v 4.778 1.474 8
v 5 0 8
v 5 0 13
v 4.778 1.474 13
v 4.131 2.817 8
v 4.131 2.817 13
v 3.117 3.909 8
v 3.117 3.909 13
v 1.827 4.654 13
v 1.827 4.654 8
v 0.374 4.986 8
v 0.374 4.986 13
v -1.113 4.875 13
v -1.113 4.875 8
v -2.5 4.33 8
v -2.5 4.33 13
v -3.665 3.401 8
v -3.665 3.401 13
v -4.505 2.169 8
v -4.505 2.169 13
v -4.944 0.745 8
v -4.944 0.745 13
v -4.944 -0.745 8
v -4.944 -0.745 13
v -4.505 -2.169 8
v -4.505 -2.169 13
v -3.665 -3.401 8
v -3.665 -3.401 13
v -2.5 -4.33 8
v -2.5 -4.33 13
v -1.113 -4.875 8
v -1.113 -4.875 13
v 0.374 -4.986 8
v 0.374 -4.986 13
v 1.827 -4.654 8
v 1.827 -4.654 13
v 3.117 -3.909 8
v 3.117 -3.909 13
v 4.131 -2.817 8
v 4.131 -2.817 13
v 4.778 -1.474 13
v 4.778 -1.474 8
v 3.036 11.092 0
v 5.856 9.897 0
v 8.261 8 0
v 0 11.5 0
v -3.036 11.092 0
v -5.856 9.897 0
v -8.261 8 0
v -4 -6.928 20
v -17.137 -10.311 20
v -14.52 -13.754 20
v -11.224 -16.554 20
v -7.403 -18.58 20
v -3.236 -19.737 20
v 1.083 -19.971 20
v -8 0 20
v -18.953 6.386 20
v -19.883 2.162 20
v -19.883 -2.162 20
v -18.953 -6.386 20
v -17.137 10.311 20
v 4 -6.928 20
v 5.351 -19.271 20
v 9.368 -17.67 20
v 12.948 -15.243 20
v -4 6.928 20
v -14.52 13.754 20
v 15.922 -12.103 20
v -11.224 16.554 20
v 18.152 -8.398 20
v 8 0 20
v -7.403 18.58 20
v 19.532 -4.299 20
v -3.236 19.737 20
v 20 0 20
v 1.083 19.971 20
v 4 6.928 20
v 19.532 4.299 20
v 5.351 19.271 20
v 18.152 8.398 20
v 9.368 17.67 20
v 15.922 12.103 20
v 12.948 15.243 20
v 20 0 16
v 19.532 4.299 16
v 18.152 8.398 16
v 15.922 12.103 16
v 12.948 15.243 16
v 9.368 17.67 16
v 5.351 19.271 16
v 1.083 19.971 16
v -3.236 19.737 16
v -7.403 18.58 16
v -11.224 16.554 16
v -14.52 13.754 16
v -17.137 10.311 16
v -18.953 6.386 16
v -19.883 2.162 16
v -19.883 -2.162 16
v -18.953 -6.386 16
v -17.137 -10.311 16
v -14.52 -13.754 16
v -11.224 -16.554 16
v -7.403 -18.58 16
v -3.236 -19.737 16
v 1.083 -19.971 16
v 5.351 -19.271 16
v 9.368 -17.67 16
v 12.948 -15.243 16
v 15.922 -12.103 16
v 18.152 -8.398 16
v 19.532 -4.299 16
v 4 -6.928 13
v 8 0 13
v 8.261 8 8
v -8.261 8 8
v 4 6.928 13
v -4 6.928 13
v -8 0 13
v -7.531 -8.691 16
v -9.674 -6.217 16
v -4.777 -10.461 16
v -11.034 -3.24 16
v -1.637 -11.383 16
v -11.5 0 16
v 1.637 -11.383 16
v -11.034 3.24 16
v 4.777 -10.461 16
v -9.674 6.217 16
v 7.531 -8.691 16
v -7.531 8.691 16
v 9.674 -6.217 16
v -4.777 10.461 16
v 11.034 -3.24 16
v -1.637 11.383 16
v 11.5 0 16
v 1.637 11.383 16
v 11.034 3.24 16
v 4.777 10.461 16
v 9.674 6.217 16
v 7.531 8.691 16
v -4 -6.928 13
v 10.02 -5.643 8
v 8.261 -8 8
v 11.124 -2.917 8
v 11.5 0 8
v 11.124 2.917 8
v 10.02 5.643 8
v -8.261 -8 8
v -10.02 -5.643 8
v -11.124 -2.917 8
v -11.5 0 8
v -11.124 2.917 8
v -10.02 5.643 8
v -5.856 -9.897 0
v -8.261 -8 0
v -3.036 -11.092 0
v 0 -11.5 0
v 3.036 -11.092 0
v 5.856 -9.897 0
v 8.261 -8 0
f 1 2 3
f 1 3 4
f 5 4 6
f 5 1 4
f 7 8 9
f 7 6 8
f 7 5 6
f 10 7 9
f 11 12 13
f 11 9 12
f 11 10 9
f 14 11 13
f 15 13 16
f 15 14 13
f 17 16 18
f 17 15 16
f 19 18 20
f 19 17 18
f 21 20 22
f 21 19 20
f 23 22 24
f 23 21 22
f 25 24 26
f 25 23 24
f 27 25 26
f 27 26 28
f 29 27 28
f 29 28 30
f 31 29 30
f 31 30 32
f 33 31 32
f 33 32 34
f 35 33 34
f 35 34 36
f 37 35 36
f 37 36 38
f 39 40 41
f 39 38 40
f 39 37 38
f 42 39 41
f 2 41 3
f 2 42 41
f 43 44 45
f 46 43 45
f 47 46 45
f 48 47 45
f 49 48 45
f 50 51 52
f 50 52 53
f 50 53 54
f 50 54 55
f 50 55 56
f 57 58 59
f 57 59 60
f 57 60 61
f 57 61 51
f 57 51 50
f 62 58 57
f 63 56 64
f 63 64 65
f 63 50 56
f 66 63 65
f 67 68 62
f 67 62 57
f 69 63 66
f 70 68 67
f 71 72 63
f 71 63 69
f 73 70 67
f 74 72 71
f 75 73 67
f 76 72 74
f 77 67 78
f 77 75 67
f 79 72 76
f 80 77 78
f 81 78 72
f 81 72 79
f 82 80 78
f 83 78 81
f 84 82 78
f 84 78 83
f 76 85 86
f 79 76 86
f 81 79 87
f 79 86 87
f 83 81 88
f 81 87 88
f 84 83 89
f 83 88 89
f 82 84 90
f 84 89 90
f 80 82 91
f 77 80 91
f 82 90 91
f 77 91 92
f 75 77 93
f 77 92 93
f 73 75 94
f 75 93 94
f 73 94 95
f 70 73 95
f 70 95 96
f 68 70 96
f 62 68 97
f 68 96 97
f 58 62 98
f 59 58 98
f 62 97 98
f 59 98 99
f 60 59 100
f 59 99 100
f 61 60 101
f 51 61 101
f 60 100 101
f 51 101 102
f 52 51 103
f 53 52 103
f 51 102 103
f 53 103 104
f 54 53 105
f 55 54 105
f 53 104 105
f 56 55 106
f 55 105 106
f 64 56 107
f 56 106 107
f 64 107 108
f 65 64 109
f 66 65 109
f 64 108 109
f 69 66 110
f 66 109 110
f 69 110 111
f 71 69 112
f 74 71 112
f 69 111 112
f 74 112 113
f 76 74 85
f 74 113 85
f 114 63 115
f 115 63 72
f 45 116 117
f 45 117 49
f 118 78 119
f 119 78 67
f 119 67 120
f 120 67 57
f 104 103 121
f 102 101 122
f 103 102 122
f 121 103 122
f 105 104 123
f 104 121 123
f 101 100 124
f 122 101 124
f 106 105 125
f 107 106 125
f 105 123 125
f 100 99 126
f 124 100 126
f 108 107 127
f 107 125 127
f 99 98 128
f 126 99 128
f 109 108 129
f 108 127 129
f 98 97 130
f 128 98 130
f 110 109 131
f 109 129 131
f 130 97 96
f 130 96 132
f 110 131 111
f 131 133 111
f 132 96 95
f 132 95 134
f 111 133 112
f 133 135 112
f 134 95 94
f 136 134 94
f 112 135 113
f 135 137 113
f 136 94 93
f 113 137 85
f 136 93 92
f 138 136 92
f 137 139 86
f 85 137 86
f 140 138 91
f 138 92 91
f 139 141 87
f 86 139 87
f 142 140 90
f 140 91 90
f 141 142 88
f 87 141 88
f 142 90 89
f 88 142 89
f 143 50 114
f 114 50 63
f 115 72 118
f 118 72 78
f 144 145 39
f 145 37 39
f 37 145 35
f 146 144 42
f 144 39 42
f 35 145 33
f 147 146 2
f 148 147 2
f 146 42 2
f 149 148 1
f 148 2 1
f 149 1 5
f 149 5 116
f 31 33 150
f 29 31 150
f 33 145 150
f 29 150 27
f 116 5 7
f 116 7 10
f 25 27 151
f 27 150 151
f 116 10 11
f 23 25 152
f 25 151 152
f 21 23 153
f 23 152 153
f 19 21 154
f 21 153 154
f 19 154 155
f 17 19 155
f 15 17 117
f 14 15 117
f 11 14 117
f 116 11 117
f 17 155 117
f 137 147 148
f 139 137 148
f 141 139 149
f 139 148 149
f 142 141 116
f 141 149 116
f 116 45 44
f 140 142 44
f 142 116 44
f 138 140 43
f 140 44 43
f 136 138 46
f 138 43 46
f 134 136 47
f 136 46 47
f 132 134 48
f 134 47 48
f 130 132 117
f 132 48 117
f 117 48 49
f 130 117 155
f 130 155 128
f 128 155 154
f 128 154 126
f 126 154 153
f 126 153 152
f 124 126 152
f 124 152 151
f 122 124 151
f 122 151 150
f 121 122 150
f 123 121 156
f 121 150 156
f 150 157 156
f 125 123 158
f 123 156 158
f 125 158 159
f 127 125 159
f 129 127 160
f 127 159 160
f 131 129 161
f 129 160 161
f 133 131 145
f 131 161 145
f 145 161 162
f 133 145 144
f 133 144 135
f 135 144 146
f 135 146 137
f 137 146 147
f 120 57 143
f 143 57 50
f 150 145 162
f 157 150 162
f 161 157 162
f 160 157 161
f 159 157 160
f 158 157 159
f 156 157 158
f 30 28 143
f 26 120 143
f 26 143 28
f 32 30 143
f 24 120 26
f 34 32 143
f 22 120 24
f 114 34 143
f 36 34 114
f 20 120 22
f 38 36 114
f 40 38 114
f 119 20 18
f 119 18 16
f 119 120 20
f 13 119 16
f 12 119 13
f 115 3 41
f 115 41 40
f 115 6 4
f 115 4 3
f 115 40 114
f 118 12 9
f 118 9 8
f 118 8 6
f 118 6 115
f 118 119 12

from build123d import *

# Parameters (mm, degrees)
SKETCH1_R               = 11.5
SKETCH1_R_2             = 5
BOSS_EXTRUDE1_DEPTH     = 20
CUT_EXTRUDE1_DEPTH      = 7
CUT_EXTRUDE2_DEPTH      = 26.777897509
CUT_EXTRUDE2_DEPTH_BACK = 26.777897509
SKETCH3_W               = 8
SKETCH3_H               = 16
BOSS_EXTRUDE2_START     = -4
SKETCH4_R               = 20
SKETCH4_R_2             = 11.5
BOSS_EXTRUDE2_DEPTH     = 4


with BuildPart() as part:
    # Sketch1 → Boss-Extrude1 (new body)
    with BuildSketch(Plane.XY):
        Circle(SKETCH1_R)
        Circle(SKETCH1_R_2, mode=Mode.SUBTRACT)
    extrude(amount=BOSS_EXTRUDE1_DEPTH)

    # Sketch2 → Cut-Extrude1 (cut)
    with BuildSketch(Plane.XY.offset(20)):
        Polygon((8, 0), (4, 6.92820323), (-4, 6.92820323), (-8, 0), (-4, -6.92820323), (4, -6.92820323), align=None)
    extrude(amount=-CUT_EXTRUDE1_DEPTH, mode=Mode.SUBTRACT)

    # Sketch3 → Cut-Extrude2 (cut, two sides: drawn at the far end of the back side and taken through both)
    with BuildSketch(Plane(origin=(0, 0, 0), x_dir=(0, 0, -1), z_dir=(1, 0, 0)).offset(-CUT_EXTRUDE2_DEPTH_BACK)):
        with Locations((-4, 0)):
            Rectangle(SKETCH3_W, SKETCH3_H)
    extrude(amount=CUT_EXTRUDE2_DEPTH + CUT_EXTRUDE2_DEPTH_BACK, mode=Mode.SUBTRACT)

    # Sketch4 → Boss-Extrude2 (add)
    with BuildSketch(Plane.XY.offset(20).offset(BOSS_EXTRUDE2_START)):
        Circle(SKETCH4_R)
        with Locations(Location((0, 0, 0), (0, 0, 135.920790152))):
            Circle(SKETCH4_R_2, mode=Mode.SUBTRACT)
    extrude(amount=BOSS_EXTRUDE2_DEPTH)


solid = part.part
